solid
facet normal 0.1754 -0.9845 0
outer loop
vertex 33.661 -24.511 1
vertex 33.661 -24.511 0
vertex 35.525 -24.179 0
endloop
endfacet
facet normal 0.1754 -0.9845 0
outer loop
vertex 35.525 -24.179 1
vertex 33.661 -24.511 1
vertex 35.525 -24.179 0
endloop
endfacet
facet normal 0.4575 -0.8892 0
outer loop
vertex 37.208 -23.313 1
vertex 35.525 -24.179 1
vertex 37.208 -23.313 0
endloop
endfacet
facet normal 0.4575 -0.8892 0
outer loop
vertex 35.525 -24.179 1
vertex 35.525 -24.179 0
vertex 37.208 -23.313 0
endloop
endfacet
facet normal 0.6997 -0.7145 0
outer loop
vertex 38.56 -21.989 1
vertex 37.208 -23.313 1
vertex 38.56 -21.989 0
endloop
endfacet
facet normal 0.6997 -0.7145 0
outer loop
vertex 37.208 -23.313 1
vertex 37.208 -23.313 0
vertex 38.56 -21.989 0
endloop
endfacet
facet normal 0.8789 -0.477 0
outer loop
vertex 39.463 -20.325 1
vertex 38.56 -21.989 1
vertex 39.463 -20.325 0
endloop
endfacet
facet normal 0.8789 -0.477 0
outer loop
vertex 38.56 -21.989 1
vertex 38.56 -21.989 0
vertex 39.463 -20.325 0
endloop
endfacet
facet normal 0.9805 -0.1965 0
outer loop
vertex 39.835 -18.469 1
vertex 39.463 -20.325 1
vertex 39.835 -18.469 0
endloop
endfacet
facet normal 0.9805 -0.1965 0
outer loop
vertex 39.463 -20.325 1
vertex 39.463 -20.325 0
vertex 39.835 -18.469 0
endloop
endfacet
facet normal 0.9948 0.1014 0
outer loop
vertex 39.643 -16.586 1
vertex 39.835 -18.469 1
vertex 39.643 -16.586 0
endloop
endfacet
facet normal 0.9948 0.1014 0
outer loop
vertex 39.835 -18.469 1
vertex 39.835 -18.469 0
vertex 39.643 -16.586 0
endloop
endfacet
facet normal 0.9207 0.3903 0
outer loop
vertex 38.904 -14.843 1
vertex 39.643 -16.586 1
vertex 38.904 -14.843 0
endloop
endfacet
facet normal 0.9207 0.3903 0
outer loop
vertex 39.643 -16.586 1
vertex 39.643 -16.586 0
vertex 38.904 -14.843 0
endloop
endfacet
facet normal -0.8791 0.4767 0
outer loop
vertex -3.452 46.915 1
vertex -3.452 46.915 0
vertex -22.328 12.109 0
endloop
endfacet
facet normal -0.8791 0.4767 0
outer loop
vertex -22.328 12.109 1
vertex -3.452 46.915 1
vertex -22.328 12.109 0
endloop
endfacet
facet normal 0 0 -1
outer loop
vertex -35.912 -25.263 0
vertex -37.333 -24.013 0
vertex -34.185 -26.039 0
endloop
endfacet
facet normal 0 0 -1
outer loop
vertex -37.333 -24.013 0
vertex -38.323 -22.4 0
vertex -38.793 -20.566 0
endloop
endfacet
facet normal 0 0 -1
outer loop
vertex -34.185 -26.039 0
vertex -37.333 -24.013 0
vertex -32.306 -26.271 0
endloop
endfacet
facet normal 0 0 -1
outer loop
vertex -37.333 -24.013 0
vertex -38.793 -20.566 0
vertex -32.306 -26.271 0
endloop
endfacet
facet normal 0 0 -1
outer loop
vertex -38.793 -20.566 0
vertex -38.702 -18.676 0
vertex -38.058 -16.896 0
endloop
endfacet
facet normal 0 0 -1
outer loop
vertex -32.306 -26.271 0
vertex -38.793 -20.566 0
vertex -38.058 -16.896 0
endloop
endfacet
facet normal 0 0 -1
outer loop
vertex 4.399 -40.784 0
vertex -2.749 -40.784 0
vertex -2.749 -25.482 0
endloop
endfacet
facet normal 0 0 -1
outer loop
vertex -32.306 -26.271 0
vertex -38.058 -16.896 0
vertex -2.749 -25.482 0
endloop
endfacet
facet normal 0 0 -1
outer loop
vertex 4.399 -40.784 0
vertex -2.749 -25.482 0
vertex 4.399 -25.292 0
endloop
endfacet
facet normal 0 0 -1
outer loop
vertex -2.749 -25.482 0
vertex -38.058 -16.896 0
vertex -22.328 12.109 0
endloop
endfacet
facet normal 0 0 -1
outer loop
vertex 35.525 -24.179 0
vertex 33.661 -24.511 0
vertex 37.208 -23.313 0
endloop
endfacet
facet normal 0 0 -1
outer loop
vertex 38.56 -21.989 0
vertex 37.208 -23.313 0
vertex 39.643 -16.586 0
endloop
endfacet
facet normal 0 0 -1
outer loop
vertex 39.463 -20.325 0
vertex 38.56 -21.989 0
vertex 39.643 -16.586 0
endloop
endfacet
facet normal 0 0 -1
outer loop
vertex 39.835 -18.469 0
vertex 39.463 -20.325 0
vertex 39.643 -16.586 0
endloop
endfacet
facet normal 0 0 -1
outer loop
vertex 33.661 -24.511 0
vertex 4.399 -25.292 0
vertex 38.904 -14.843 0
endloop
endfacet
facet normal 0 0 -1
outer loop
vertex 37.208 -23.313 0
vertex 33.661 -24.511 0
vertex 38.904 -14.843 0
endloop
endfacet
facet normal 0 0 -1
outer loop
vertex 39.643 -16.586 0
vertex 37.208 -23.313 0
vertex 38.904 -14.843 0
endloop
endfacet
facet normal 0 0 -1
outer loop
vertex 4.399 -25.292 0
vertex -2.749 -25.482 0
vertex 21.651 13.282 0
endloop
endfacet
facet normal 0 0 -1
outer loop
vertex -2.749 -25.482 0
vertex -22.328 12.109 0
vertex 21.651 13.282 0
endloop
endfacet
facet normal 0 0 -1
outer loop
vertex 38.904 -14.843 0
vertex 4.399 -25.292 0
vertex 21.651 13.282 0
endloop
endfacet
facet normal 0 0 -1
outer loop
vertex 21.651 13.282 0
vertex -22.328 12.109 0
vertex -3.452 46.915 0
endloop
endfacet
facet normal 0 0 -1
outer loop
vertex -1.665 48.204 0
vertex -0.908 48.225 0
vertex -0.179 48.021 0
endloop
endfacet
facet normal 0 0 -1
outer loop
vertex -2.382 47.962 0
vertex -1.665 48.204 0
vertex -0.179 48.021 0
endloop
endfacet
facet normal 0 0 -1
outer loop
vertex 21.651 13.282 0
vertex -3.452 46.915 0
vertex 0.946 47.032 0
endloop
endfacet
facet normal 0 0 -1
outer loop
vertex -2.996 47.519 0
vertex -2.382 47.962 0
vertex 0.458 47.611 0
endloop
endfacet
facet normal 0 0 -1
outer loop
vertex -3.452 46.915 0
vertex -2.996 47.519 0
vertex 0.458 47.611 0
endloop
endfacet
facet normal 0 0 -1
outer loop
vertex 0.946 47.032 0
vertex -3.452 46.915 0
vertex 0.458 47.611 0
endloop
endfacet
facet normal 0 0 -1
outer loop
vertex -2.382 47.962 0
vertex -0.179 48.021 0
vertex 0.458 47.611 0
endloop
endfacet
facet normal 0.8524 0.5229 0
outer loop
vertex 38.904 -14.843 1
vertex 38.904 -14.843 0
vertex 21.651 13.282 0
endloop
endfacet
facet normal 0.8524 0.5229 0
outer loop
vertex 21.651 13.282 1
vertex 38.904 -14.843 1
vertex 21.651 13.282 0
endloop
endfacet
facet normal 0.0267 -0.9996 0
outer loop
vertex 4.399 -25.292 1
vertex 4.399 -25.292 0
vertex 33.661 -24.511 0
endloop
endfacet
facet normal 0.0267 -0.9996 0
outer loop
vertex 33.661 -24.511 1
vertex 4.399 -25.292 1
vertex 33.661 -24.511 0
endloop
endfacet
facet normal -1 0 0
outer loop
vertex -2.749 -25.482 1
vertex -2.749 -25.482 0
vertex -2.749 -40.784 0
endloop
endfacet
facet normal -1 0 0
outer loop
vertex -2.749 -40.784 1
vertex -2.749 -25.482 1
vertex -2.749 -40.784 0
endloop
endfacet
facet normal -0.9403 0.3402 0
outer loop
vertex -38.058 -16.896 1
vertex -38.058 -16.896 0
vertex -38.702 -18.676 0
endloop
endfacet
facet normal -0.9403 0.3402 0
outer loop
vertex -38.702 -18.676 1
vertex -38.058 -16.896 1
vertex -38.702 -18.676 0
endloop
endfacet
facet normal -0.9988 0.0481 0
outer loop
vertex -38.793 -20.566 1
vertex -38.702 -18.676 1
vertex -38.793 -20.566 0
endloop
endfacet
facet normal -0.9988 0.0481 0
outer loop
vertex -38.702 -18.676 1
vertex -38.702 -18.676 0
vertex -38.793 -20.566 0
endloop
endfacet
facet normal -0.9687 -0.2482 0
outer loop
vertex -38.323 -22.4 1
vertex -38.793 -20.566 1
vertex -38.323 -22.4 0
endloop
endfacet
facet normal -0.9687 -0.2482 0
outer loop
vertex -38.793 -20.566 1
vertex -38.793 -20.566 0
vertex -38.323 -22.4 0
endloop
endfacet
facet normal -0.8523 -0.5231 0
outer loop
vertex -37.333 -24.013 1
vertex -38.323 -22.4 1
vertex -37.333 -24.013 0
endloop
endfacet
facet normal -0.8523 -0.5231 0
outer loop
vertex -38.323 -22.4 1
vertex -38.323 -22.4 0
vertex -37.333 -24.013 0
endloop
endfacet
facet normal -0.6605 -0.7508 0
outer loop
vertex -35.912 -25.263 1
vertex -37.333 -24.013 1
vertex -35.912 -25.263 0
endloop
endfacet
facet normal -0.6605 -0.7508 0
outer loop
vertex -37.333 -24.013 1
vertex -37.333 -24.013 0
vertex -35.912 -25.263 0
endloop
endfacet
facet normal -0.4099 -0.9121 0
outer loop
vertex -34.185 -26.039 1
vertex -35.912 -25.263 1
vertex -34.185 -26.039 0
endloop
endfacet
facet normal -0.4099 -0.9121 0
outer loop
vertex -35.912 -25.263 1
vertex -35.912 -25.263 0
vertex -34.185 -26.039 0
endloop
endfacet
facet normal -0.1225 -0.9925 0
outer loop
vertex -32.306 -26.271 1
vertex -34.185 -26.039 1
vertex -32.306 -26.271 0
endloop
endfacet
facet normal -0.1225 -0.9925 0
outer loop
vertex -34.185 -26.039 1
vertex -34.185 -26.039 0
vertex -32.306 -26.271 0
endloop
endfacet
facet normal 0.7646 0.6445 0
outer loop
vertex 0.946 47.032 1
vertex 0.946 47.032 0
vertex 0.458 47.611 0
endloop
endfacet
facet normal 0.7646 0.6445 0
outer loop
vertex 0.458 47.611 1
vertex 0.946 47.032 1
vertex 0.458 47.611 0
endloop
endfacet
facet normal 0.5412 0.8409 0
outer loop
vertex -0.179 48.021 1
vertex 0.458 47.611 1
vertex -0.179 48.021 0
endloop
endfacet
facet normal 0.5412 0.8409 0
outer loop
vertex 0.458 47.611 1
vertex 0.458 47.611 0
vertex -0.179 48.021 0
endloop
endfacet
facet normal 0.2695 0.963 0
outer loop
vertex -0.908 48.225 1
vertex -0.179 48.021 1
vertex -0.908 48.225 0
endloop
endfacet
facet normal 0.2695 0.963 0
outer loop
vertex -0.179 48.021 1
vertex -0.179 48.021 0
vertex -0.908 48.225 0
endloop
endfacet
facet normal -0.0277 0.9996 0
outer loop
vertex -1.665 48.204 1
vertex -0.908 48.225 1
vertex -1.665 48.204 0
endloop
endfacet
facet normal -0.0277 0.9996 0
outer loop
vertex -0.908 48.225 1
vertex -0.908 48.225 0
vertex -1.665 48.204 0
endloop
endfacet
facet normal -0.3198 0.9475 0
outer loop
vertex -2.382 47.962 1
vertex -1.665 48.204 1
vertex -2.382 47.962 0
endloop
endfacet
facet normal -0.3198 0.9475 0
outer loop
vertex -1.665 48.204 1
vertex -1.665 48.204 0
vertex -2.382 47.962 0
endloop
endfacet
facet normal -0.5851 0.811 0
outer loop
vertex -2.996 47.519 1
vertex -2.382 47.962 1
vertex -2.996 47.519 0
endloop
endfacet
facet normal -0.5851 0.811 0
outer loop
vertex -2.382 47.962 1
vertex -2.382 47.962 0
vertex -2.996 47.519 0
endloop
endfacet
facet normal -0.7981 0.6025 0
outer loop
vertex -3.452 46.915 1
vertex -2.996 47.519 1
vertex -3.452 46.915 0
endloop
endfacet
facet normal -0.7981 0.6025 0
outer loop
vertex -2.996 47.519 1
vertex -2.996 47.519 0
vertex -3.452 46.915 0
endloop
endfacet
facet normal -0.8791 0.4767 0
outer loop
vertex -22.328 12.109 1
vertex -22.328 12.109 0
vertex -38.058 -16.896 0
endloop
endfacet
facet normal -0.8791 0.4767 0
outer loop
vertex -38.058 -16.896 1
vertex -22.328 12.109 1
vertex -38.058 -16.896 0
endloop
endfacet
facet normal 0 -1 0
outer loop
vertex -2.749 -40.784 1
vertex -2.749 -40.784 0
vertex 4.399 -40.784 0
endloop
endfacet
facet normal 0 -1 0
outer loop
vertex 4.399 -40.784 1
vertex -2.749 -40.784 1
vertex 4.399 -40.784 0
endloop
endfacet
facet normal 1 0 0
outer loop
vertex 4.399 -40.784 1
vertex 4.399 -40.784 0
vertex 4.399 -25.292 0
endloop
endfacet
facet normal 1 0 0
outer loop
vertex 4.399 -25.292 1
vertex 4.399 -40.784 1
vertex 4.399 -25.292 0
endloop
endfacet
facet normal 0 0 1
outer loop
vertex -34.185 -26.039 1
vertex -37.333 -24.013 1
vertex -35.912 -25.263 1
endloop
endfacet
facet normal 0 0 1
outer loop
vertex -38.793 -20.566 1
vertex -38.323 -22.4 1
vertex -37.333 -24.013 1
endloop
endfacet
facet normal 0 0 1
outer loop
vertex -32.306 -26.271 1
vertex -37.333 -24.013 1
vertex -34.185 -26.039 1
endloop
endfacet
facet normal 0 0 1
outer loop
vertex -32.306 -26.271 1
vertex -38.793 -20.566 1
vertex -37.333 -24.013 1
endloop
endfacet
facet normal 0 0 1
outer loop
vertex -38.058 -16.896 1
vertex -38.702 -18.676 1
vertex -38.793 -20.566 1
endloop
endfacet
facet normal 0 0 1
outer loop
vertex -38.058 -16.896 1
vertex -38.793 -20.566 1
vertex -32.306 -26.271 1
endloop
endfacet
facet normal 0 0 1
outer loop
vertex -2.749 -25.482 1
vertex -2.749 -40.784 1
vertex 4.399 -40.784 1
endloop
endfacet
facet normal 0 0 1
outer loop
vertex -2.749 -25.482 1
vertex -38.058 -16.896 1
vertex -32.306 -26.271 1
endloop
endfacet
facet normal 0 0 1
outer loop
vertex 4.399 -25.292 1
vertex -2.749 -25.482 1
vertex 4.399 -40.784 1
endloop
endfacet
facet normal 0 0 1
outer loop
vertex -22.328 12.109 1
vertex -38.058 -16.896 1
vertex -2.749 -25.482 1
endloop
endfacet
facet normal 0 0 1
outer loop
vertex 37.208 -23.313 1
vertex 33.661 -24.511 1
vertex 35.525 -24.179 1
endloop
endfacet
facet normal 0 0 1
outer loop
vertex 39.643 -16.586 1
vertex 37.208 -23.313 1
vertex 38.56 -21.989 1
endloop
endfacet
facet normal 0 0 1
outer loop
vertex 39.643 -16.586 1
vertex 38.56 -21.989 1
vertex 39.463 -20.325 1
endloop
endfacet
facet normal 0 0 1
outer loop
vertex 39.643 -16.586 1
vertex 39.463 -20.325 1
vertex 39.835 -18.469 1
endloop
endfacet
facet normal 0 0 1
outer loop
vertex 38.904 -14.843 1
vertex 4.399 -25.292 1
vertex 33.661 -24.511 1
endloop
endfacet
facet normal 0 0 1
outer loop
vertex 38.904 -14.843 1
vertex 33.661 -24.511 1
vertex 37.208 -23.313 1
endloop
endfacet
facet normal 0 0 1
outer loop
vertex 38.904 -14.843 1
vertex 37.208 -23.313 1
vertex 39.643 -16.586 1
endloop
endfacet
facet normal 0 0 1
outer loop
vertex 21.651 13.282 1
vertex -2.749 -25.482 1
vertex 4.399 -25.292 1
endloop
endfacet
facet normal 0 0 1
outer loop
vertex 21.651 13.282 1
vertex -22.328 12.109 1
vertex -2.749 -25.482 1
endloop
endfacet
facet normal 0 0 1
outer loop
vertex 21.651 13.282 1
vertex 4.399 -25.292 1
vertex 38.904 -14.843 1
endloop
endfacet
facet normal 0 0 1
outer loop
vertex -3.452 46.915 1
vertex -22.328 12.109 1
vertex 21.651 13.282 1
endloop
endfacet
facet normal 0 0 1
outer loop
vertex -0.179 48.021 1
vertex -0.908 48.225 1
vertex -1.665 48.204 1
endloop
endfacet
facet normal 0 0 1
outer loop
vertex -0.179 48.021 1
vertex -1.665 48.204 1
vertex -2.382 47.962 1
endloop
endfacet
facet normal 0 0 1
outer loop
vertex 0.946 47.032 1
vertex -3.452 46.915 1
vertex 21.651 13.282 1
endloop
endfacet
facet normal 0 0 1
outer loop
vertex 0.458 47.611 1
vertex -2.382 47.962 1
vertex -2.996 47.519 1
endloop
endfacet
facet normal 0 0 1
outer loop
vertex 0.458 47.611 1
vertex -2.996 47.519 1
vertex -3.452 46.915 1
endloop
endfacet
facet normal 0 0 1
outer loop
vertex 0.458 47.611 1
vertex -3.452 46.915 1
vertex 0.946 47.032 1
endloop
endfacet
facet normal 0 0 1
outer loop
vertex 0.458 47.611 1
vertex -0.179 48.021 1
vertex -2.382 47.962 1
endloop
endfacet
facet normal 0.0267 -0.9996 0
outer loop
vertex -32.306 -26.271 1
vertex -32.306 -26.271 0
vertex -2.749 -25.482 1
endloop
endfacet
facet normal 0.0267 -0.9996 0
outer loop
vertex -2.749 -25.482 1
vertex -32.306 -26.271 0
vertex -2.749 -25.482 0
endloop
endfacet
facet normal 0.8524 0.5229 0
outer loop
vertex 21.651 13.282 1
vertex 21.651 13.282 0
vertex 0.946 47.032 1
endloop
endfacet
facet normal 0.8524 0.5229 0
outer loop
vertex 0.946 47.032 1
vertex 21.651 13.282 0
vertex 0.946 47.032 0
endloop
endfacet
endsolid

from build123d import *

# Parameters (mm, degrees)
F1_DEPTH = 1


# Not quite as in the source:
# - a feature names something its author has since deleted; it is built from what else it names


with BuildPart() as f1:
    # F0 (on Top) → F1 (new body)
    with BuildSketch(Plane.XY):
        with BuildLine():
            Line((-2.7494849637, -25.4823859731), (-2.7494849637, -25.250749146))
            ThreePointArc((-2.7494849637, -25.250749146), (-22.497868801, -11.7900763108), (-22.3279049811, 12.1088669642))
            Line((-22.3279049811, 12.1088669642), (-38.057784897, -16.8959317215))
            ThreePointArc((-38.057784897, -16.8959317215), (-37.8884434924, -23.2436733268), (-32.3064673032, -26.2708901713))
            Line((-32.3064673032, -26.2708901713), (-2.7494849637, -25.4823859731))
        make_face()
        with BuildLine():
            ThreePointArc((25.4, 0), (19.4537790742, -16.3312730591), (4.3991748244, -25.0161400073))
            Line((4.3991748244, -25.0161400073), (4.3991748244, -25.2916781332))
            Line((4.3991748244, -25.2916781332), (33.6611985399, -24.5110426718))
            ThreePointArc((33.6611985399, -24.5110426718), (39.0738333245, -21.1905179108), (38.9044919199, -14.8427763054))
            Line((38.9044919199, -14.8427763054), (21.6505391613, 13.2820990068))
            ThreePointArc((21.6505391613, 13.2820990068), (24.4446690988, 6.9005907466), (25.4, 0))
        make_face()
        with BuildLine():
            ThreePointArc((-22.3279049811, 12.1088669642), (-22.497868801, -11.7900763108), (-2.7494849637, -25.250749146))
            ThreePointArc((-2.7494849637, -25.250749146), (0.8331443579, -25.3863323558), (4.3991748244, -25.0161400073))
            ThreePointArc((4.3991748244, -25.0161400073), (19.4537790742, -16.3312730591), (25.4, 0))
            ThreePointArc((25.4, 0), (24.4446690988, 6.9005907466), (21.6505391613, 13.2820990068))
            ThreePointArc((21.6505391613, 13.2820990068), (-0.6773658317, 25.3909664158), (-22.3279049811, 12.1088669642))
        make_face()
        with BuildLine():
            Line((-3.4520485887, 46.9146262965), (-22.3279049811, 12.1088669642))
            ThreePointArc((-22.3279049811, 12.1088669642), (-0.6773658317, 25.3909664158), (21.6505391613, 13.2820990068))
            Line((21.6505391613, 13.2820990068), (0.9457958008, 47.0319494631))
            ThreePointArc((0.9457958008, 47.0319494631), (-1.2869946749, 48.2428362009), (-3.4520485887, 46.9146262965))
        make_face()
        with BuildLine():
            ThreePointArc((4.3991748244, -25.0161400073), (0.8331443579, -25.3863323558), (-2.7494849637, -25.250749146))
            Line((-2.7494849637, -25.250749146), (-2.7494849637, -25.4823859731))
            Line((-2.7494849637, -25.4823859731), (-2.7494849637, -40.7840199769))
            Line((-2.7494849637, -40.7840199769), (4.3991748244, -40.7840199769))
            Line((4.3991748244, -40.7840199769), (4.3991748244, -25.2916781332))
            Line((4.3991748244, -25.2916781332), (4.3991748244, -25.0161400073))
        make_face()
    extrude(amount=F1_DEPTH)


solid = f1.part
